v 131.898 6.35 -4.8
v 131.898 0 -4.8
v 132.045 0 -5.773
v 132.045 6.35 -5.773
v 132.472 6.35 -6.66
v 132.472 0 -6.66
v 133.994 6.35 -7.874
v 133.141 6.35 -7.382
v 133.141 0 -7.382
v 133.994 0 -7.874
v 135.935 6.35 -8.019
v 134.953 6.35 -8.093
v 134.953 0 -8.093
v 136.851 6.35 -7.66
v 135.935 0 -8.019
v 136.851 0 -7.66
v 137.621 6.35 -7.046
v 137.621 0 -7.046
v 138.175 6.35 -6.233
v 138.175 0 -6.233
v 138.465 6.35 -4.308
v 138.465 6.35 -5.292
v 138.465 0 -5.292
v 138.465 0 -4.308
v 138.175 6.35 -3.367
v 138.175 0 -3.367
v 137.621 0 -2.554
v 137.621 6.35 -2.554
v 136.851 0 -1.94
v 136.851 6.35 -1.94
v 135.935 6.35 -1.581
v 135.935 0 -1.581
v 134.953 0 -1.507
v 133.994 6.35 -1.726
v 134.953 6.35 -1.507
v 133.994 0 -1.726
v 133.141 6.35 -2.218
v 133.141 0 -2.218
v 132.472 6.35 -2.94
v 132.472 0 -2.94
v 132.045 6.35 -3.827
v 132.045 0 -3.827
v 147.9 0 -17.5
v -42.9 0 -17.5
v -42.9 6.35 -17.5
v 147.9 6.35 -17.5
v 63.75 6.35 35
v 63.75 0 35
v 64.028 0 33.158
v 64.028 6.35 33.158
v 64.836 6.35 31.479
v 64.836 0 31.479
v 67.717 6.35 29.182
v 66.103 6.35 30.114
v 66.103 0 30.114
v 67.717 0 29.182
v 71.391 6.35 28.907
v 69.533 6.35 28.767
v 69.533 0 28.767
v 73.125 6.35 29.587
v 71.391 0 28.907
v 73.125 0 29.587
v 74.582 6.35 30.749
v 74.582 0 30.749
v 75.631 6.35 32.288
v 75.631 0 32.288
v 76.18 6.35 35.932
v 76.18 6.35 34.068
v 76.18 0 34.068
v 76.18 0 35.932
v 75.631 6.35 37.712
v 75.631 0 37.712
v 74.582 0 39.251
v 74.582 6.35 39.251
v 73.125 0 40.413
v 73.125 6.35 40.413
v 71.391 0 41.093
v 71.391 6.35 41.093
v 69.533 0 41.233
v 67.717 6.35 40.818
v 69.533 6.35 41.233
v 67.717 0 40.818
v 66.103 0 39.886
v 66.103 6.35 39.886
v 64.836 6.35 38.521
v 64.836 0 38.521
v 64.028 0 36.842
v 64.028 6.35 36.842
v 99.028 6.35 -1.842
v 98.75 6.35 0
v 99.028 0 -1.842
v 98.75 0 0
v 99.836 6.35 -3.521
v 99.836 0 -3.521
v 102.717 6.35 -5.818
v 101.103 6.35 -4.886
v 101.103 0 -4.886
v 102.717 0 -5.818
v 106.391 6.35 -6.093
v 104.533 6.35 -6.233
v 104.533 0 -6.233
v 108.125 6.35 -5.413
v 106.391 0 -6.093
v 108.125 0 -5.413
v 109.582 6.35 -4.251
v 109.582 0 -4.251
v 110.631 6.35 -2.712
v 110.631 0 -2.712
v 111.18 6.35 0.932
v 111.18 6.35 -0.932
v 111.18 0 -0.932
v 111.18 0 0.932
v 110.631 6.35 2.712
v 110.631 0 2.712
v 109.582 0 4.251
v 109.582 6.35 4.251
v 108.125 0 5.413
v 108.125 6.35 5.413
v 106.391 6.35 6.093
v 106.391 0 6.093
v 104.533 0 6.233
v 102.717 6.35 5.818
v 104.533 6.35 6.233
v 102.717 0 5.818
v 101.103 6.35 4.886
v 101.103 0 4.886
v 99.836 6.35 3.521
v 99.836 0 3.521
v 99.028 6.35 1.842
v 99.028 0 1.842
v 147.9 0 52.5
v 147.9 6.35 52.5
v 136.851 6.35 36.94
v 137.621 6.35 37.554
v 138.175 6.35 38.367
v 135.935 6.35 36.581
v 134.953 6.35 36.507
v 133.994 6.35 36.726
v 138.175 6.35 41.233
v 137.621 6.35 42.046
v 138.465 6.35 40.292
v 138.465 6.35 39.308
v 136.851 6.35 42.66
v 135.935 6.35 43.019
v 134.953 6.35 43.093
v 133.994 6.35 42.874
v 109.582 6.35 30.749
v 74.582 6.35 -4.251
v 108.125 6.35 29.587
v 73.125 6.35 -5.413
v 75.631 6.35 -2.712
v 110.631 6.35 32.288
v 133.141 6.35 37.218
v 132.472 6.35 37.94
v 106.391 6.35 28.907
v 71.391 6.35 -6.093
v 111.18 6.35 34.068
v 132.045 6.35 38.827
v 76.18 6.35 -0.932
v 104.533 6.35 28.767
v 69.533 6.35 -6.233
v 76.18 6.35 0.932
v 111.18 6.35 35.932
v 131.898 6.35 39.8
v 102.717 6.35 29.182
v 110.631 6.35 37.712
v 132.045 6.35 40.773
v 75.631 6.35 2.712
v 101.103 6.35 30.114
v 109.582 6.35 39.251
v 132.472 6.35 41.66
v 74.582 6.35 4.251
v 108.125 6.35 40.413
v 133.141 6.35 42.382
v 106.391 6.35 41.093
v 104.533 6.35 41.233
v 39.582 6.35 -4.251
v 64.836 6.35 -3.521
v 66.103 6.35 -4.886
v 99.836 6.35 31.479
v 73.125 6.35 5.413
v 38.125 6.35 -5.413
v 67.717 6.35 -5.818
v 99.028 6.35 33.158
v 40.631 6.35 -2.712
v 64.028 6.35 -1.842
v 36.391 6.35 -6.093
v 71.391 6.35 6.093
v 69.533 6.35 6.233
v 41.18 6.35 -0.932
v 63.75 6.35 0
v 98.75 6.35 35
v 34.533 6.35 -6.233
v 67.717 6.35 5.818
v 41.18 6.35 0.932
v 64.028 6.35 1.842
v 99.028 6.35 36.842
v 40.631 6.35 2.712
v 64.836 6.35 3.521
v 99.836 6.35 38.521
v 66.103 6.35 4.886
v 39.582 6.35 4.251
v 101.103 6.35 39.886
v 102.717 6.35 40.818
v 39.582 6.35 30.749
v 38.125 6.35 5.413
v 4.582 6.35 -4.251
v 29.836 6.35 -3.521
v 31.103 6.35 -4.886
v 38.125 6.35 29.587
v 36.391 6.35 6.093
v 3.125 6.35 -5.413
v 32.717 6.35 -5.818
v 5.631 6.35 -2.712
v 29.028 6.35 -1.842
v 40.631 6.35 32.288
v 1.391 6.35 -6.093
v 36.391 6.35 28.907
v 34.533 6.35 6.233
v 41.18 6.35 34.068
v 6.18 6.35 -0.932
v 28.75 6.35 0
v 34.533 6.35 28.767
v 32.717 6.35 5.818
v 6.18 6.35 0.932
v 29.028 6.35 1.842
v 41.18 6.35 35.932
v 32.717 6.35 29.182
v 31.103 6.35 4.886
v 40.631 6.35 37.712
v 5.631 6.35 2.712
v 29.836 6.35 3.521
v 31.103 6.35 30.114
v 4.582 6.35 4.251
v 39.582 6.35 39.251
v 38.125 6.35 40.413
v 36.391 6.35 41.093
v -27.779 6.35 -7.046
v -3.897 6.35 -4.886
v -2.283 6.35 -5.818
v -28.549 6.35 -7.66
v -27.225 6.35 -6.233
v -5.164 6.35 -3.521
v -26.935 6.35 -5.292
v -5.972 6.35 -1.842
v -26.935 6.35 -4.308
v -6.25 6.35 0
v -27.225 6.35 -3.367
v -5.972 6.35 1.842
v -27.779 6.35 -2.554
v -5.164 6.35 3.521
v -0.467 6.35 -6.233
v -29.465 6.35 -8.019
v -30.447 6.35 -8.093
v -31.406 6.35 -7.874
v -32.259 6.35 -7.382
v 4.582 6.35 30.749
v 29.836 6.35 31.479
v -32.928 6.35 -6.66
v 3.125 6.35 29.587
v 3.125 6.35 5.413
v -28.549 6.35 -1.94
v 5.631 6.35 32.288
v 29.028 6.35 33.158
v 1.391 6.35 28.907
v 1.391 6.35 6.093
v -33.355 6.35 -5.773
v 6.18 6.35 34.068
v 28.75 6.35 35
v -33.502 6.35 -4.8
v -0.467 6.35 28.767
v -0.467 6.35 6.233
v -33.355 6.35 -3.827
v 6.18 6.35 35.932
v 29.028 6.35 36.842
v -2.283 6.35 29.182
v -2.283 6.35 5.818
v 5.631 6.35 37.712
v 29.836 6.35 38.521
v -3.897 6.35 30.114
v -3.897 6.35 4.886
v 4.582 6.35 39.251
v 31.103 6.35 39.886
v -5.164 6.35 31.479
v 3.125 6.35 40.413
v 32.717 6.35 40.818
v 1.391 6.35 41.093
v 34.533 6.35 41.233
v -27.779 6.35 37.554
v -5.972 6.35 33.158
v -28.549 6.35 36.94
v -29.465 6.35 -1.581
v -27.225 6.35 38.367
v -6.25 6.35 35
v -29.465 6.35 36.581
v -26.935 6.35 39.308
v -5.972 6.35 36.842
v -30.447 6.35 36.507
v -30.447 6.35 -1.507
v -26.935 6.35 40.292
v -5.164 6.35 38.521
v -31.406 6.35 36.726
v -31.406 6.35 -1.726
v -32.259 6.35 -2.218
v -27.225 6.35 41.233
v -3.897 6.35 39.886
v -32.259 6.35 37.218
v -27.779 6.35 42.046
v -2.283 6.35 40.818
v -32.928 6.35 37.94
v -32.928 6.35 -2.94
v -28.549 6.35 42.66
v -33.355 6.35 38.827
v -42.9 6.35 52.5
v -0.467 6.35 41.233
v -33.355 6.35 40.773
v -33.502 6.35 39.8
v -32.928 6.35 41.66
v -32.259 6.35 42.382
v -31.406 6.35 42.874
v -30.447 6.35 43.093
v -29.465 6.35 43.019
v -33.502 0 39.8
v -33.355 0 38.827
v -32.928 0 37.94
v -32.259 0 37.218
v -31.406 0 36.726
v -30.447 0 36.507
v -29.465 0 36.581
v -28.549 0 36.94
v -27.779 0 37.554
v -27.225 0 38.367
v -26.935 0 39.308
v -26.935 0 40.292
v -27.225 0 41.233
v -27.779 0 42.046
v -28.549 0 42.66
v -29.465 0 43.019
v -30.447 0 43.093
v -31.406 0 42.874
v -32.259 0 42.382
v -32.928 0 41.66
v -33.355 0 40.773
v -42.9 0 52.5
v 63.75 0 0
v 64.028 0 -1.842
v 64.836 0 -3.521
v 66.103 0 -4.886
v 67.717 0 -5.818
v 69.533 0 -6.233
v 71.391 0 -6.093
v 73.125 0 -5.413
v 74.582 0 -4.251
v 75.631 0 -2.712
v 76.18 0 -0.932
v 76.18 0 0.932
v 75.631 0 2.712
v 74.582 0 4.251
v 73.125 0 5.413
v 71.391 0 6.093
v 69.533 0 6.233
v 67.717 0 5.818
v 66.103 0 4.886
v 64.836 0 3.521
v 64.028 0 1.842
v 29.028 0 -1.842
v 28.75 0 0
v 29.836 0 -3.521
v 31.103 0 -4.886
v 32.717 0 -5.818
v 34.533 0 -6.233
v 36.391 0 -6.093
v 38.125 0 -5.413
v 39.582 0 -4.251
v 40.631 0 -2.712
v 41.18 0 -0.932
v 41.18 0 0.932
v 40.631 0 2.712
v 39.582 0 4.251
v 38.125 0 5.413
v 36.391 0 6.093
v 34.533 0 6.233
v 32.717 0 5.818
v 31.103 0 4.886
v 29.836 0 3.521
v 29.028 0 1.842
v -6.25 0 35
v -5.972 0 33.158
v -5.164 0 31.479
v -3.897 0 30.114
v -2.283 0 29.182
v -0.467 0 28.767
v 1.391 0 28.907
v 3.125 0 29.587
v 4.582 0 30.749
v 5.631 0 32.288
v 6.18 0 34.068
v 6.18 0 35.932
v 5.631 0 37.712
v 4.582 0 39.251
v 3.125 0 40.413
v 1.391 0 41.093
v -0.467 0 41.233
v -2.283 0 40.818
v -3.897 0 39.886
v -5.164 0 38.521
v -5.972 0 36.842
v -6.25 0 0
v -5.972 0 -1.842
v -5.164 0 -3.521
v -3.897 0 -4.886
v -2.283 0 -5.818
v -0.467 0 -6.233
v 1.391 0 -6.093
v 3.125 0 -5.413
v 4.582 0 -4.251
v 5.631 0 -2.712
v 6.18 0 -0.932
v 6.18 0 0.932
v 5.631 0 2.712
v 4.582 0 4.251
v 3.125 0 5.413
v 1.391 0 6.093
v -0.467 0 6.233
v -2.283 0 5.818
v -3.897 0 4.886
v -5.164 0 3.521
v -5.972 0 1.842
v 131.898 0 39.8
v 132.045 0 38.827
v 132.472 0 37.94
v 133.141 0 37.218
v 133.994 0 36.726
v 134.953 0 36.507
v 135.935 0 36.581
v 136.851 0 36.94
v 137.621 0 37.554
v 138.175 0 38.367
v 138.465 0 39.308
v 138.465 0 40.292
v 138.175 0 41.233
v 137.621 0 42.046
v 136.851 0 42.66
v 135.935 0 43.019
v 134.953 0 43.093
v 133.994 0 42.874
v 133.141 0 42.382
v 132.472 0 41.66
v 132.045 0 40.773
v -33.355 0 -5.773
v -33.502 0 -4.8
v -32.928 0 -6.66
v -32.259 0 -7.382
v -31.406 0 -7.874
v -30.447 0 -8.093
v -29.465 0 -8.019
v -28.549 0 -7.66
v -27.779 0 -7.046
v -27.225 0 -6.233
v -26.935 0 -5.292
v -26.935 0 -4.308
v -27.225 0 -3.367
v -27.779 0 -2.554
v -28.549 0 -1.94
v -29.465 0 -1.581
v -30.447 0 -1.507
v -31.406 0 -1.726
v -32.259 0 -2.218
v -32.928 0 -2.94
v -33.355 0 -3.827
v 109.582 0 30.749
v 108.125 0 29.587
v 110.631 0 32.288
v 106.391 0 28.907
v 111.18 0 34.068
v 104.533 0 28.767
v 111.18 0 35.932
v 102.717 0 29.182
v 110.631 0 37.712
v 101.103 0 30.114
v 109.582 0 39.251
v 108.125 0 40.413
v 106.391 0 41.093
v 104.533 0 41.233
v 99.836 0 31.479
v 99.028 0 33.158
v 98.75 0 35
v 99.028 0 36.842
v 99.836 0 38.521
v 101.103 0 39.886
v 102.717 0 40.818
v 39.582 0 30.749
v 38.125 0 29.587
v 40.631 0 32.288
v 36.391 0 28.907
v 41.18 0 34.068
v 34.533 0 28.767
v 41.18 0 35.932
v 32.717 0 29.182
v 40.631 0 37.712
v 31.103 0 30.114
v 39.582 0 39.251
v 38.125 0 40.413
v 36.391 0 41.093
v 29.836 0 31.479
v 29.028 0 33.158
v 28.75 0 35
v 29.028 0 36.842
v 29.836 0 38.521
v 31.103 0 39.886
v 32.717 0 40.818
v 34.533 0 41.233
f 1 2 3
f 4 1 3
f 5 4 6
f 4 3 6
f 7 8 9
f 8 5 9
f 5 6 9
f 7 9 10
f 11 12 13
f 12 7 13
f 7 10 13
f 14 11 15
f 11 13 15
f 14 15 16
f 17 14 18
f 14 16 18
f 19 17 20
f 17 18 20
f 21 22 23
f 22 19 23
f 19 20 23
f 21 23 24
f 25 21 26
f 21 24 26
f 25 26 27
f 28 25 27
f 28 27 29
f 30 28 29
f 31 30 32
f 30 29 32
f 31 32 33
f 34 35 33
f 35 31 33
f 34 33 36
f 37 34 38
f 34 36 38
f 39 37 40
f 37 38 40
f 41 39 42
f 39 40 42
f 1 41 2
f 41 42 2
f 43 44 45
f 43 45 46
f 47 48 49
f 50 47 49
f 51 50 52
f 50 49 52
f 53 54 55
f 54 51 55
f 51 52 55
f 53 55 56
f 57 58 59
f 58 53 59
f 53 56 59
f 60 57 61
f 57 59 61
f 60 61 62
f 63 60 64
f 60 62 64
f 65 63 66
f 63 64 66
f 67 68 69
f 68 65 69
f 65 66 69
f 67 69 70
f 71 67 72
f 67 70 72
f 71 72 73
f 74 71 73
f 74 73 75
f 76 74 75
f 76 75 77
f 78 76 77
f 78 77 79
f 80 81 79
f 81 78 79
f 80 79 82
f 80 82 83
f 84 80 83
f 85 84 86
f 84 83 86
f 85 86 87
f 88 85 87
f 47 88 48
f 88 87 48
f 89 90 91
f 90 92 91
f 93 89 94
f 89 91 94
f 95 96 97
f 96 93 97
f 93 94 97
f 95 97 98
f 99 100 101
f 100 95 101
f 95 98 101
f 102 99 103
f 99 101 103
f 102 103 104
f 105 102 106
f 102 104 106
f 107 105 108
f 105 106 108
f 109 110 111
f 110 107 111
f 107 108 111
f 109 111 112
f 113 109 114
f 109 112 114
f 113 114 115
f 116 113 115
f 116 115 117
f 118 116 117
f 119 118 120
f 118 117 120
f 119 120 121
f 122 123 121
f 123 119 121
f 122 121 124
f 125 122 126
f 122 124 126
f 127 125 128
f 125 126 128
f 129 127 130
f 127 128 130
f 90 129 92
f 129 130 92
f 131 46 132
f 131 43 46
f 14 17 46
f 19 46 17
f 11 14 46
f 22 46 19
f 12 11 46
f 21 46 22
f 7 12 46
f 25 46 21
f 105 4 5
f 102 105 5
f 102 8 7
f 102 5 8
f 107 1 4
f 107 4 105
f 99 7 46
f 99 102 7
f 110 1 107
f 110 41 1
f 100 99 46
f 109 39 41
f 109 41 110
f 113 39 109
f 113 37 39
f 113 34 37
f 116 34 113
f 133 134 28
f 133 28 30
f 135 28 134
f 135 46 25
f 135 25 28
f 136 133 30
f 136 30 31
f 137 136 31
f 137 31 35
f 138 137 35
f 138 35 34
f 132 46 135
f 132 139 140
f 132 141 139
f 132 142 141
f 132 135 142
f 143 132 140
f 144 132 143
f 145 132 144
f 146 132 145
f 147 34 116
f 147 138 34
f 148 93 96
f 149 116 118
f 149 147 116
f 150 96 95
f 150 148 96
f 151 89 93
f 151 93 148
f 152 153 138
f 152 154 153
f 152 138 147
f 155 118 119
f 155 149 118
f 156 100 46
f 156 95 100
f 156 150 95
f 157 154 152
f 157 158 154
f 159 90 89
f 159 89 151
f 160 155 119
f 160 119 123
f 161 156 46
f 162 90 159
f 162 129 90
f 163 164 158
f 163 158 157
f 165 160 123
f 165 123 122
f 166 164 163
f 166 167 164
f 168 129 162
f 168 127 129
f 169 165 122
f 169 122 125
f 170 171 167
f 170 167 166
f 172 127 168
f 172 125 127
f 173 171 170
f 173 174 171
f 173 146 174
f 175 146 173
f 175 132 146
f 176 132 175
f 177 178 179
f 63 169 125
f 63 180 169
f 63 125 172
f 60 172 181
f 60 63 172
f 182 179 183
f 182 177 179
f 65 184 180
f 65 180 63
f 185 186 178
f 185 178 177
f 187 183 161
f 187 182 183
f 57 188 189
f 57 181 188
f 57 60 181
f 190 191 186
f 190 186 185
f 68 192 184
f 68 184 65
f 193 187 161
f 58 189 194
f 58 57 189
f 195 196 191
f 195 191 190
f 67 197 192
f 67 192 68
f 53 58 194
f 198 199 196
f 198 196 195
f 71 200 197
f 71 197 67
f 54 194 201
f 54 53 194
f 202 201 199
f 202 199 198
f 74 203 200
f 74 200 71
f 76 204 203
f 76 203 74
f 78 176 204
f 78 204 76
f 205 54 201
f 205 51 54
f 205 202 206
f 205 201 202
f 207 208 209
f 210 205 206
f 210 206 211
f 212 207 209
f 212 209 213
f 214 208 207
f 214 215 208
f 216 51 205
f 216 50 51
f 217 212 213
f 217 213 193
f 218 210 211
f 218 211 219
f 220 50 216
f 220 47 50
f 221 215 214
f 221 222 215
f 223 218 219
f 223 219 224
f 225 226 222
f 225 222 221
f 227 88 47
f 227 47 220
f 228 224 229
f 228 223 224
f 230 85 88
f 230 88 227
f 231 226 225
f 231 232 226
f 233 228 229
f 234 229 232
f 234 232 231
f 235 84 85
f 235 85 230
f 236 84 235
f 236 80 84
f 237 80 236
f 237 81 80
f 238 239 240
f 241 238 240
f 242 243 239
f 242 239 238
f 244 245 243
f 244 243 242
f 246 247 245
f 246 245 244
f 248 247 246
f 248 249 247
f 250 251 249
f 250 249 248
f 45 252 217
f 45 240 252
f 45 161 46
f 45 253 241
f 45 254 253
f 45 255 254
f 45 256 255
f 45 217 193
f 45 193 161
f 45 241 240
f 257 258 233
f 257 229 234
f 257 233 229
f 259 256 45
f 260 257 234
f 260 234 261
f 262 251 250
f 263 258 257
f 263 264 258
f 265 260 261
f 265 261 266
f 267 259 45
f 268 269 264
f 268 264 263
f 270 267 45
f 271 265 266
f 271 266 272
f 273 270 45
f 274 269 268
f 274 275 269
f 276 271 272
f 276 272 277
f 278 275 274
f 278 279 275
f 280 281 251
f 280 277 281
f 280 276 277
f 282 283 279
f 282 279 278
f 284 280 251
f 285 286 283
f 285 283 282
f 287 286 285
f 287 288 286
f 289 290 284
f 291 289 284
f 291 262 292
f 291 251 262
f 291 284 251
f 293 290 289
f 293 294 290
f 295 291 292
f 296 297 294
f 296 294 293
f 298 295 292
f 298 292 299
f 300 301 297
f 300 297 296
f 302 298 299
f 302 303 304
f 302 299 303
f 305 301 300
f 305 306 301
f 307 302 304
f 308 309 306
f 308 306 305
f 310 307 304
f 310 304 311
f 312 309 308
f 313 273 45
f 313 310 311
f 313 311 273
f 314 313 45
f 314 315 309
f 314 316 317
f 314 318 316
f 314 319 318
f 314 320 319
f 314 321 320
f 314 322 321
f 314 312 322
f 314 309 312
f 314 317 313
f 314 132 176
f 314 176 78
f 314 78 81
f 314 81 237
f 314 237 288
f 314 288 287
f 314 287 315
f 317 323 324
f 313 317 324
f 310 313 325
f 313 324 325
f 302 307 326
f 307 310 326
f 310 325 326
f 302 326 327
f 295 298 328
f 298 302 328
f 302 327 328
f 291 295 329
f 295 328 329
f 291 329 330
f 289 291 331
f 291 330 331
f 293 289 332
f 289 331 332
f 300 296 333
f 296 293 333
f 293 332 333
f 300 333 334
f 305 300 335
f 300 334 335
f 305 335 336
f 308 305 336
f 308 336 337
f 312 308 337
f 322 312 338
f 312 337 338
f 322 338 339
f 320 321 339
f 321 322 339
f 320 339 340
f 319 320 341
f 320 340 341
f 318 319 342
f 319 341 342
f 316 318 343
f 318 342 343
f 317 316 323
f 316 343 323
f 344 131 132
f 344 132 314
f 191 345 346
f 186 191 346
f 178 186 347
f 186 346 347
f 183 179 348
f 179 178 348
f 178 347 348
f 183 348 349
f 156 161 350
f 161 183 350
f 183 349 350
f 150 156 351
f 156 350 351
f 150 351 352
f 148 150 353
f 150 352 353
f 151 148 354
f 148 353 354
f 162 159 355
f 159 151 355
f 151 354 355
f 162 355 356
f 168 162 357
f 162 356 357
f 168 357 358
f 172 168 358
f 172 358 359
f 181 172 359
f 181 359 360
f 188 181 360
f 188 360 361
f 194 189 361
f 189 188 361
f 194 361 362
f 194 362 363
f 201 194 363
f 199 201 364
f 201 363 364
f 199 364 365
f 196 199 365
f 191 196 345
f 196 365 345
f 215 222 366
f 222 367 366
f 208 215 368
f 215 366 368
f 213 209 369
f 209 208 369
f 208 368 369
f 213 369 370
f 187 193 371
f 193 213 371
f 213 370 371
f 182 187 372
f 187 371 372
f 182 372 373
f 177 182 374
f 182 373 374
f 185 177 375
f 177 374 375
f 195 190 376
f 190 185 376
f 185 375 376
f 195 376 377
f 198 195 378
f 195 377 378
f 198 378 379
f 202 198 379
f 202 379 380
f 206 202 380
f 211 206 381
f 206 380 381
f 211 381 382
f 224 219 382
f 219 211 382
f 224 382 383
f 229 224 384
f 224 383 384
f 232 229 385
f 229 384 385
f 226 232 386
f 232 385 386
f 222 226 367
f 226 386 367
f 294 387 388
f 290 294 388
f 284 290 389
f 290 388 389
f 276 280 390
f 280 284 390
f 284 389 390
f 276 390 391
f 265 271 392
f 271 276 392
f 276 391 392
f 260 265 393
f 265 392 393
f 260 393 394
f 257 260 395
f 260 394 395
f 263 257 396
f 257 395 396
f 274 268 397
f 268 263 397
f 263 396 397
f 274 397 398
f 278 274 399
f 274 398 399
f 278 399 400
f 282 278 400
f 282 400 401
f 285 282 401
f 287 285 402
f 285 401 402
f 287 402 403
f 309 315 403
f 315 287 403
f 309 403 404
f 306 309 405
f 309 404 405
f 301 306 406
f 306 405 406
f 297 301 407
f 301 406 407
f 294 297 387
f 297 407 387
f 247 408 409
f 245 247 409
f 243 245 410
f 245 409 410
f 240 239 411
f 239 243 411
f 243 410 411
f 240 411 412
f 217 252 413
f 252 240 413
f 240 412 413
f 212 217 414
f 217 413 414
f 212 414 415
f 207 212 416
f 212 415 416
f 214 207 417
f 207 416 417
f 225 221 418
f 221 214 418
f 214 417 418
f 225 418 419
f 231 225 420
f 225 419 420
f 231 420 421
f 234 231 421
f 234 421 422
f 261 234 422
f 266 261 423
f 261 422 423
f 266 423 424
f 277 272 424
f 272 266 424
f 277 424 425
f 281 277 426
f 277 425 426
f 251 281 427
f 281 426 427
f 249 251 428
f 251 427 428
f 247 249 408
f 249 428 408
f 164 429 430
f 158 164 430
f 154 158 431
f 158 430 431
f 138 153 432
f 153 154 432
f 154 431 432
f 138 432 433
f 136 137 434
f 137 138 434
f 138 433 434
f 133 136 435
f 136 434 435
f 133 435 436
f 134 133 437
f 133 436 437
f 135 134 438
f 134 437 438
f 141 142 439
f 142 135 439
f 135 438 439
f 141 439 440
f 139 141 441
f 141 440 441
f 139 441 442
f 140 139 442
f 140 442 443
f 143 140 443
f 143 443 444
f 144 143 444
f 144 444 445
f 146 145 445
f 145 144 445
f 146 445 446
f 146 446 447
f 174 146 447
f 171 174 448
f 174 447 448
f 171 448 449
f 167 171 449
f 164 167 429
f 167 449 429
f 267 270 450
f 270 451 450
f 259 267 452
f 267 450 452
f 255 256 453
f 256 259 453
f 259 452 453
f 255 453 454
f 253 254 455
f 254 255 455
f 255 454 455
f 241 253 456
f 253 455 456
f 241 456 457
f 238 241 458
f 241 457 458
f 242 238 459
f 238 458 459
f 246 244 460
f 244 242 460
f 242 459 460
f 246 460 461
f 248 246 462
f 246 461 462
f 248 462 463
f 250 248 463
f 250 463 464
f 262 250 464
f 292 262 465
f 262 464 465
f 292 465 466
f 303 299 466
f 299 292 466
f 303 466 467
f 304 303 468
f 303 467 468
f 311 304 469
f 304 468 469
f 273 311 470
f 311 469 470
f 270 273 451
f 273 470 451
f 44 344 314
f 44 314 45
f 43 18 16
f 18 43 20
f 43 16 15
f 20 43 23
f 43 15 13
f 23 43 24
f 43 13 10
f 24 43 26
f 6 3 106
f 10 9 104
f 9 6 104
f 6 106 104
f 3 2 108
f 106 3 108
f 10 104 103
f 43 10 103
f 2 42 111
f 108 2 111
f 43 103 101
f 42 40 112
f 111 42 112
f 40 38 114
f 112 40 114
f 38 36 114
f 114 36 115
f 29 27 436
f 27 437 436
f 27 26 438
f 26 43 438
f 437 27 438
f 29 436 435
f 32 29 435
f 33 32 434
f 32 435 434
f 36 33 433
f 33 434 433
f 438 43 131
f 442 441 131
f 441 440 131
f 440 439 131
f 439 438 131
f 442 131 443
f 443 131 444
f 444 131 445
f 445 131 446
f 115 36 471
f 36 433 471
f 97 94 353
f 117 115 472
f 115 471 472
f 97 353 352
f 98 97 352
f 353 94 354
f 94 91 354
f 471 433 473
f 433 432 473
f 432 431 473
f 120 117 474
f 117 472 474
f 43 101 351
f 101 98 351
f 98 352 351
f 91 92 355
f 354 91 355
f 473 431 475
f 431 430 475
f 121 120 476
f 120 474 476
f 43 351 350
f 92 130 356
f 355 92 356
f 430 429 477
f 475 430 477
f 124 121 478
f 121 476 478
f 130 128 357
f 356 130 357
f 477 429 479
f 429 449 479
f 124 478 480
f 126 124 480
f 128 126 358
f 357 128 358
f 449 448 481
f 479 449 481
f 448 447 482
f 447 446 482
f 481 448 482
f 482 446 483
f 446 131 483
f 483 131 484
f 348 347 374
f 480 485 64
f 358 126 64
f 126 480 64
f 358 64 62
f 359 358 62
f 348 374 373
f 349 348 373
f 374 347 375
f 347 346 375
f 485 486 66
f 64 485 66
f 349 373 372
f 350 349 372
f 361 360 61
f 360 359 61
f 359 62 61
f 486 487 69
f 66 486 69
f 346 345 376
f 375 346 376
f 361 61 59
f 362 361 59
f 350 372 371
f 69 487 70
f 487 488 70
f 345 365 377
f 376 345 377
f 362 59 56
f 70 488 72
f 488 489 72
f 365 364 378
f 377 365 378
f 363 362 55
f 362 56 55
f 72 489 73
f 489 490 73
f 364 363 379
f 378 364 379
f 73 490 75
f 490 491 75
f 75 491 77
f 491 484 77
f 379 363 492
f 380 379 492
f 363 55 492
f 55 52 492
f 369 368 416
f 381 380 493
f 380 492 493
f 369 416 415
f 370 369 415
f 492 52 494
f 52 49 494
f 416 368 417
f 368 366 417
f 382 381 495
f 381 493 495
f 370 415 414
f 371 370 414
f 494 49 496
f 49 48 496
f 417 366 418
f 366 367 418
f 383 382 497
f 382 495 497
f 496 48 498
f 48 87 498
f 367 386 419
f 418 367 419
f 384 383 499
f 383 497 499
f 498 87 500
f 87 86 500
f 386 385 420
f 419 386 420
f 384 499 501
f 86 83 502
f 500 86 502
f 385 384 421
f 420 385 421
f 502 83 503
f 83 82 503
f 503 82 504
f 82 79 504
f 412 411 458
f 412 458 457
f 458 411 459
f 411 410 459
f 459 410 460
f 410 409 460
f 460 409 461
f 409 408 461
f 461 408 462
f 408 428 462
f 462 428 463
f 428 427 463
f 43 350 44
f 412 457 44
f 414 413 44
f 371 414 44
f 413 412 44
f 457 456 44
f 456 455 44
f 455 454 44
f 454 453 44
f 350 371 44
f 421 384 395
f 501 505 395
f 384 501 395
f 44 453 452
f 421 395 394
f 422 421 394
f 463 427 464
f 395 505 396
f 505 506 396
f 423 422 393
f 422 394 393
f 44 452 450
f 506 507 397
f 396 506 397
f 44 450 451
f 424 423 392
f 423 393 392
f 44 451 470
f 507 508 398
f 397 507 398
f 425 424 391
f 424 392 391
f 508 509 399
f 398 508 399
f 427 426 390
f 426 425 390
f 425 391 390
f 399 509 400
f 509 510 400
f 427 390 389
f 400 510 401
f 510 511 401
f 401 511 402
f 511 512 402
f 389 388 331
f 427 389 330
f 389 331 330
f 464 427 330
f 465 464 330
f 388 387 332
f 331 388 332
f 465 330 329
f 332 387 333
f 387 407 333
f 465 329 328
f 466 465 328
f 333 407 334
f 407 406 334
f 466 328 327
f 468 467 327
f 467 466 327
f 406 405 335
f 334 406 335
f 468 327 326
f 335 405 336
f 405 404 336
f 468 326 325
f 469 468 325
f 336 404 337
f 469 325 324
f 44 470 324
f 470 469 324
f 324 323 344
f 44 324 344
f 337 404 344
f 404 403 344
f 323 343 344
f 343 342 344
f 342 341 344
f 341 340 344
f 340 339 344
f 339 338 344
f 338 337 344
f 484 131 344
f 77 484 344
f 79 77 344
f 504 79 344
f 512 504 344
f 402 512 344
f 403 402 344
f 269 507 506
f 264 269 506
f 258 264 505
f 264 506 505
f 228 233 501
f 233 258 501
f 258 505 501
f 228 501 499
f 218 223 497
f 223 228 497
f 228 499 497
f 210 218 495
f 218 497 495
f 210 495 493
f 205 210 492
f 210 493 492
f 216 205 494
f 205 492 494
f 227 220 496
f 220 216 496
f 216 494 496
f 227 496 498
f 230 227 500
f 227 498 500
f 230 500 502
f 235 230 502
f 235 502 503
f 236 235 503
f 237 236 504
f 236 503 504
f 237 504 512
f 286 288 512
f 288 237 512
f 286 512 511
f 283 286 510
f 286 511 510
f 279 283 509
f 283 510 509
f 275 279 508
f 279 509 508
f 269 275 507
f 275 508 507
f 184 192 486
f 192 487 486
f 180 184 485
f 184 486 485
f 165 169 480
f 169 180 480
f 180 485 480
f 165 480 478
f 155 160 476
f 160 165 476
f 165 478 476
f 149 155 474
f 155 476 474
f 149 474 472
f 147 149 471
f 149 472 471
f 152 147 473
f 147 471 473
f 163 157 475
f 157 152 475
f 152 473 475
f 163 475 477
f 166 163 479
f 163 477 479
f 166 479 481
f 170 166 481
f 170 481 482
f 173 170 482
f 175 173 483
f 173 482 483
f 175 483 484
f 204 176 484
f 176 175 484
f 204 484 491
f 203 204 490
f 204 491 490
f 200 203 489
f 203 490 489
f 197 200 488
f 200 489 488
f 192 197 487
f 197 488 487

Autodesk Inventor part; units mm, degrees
ref_plane "YZ Plane" through (0, 0, 0) normal (1, 0, 0) x (0, 1, 0)
ref_plane "XZ Plane" through (0, 0, 0) normal (0, 1, 0) x (-1, 0, 0)
ref_plane "XY Plane" through (0, 0, 0) normal (0, 0, 1) x (1, 0, 0)
sketch "Sketch1" plane through (0, 0, 0) normal (0, 1, 0) x (-1, 0, 0)
  circle A0 centre (0, 0) radius 6.25
  line L0 (0, 0) -> (0, 25.4) construction
  line L1 (0, 0) -> (-101.6, 0) construction
  circle A1 centre (0, 35) radius 6.25
  circle A2 centre (-35, 0) radius 6.25
  circle A3 centre (-35, 35) radius 6.25
  circle A4 centre (-70, 0) radius 6.25
  circle A5 centre (-70, 35) radius 6.25
  circle A6 centre (-105, 0) radius 6.25
  circle A7 centre (-105, 35) radius 6.25
  line L2 (42.9, -17.5) -> (-147.9, -17.5)
  line L3 (-147.9, -17.5) -> (-147.9, 52.5)
  line L4 (-147.9, 52.5) -> (42.9, 52.5)
  line L5 (42.9, 52.5) -> (42.9, -17.5)
  circle A8 centre (30.2, -4.8) radius 3.302
  circle A9 centre (-135.2, -4.8) radius 3.302
  circle A10 centre (-135.2, 39.8) radius 3.302
  circle A11 centre (30.2, 39.8) radius 3.302
  dimension "d0" = 12.5
  dimension "d1" = 25.4
  dimension "d2" = 101.6
  dimension "d5" = 35
  dimension "d8" = 35
  dimension "d11" = 42.9
  dimension "d12" = 42.9
  dimension "d13" = 17.5
  dimension "d14" = 17.5
  dimension "d15" = 6.604
  dimension "d16" = 12.7
  dimension "d17" = 12.7
  dimension "d18" = 6.604
  dimension "d19" = 12.7
  dimension "d20" = 6.604
  dimension "d21" = 12.7
  dimension "d22" = 6.604
extrude "Extrusion1" add sketch "Sketch1" along normal blind 6.35
equation "\"d13\" = 0.5 * d5"
equation "\"d14\" = 0.5 * d5"
properties part number "SequenceMachine_VialPlate"
